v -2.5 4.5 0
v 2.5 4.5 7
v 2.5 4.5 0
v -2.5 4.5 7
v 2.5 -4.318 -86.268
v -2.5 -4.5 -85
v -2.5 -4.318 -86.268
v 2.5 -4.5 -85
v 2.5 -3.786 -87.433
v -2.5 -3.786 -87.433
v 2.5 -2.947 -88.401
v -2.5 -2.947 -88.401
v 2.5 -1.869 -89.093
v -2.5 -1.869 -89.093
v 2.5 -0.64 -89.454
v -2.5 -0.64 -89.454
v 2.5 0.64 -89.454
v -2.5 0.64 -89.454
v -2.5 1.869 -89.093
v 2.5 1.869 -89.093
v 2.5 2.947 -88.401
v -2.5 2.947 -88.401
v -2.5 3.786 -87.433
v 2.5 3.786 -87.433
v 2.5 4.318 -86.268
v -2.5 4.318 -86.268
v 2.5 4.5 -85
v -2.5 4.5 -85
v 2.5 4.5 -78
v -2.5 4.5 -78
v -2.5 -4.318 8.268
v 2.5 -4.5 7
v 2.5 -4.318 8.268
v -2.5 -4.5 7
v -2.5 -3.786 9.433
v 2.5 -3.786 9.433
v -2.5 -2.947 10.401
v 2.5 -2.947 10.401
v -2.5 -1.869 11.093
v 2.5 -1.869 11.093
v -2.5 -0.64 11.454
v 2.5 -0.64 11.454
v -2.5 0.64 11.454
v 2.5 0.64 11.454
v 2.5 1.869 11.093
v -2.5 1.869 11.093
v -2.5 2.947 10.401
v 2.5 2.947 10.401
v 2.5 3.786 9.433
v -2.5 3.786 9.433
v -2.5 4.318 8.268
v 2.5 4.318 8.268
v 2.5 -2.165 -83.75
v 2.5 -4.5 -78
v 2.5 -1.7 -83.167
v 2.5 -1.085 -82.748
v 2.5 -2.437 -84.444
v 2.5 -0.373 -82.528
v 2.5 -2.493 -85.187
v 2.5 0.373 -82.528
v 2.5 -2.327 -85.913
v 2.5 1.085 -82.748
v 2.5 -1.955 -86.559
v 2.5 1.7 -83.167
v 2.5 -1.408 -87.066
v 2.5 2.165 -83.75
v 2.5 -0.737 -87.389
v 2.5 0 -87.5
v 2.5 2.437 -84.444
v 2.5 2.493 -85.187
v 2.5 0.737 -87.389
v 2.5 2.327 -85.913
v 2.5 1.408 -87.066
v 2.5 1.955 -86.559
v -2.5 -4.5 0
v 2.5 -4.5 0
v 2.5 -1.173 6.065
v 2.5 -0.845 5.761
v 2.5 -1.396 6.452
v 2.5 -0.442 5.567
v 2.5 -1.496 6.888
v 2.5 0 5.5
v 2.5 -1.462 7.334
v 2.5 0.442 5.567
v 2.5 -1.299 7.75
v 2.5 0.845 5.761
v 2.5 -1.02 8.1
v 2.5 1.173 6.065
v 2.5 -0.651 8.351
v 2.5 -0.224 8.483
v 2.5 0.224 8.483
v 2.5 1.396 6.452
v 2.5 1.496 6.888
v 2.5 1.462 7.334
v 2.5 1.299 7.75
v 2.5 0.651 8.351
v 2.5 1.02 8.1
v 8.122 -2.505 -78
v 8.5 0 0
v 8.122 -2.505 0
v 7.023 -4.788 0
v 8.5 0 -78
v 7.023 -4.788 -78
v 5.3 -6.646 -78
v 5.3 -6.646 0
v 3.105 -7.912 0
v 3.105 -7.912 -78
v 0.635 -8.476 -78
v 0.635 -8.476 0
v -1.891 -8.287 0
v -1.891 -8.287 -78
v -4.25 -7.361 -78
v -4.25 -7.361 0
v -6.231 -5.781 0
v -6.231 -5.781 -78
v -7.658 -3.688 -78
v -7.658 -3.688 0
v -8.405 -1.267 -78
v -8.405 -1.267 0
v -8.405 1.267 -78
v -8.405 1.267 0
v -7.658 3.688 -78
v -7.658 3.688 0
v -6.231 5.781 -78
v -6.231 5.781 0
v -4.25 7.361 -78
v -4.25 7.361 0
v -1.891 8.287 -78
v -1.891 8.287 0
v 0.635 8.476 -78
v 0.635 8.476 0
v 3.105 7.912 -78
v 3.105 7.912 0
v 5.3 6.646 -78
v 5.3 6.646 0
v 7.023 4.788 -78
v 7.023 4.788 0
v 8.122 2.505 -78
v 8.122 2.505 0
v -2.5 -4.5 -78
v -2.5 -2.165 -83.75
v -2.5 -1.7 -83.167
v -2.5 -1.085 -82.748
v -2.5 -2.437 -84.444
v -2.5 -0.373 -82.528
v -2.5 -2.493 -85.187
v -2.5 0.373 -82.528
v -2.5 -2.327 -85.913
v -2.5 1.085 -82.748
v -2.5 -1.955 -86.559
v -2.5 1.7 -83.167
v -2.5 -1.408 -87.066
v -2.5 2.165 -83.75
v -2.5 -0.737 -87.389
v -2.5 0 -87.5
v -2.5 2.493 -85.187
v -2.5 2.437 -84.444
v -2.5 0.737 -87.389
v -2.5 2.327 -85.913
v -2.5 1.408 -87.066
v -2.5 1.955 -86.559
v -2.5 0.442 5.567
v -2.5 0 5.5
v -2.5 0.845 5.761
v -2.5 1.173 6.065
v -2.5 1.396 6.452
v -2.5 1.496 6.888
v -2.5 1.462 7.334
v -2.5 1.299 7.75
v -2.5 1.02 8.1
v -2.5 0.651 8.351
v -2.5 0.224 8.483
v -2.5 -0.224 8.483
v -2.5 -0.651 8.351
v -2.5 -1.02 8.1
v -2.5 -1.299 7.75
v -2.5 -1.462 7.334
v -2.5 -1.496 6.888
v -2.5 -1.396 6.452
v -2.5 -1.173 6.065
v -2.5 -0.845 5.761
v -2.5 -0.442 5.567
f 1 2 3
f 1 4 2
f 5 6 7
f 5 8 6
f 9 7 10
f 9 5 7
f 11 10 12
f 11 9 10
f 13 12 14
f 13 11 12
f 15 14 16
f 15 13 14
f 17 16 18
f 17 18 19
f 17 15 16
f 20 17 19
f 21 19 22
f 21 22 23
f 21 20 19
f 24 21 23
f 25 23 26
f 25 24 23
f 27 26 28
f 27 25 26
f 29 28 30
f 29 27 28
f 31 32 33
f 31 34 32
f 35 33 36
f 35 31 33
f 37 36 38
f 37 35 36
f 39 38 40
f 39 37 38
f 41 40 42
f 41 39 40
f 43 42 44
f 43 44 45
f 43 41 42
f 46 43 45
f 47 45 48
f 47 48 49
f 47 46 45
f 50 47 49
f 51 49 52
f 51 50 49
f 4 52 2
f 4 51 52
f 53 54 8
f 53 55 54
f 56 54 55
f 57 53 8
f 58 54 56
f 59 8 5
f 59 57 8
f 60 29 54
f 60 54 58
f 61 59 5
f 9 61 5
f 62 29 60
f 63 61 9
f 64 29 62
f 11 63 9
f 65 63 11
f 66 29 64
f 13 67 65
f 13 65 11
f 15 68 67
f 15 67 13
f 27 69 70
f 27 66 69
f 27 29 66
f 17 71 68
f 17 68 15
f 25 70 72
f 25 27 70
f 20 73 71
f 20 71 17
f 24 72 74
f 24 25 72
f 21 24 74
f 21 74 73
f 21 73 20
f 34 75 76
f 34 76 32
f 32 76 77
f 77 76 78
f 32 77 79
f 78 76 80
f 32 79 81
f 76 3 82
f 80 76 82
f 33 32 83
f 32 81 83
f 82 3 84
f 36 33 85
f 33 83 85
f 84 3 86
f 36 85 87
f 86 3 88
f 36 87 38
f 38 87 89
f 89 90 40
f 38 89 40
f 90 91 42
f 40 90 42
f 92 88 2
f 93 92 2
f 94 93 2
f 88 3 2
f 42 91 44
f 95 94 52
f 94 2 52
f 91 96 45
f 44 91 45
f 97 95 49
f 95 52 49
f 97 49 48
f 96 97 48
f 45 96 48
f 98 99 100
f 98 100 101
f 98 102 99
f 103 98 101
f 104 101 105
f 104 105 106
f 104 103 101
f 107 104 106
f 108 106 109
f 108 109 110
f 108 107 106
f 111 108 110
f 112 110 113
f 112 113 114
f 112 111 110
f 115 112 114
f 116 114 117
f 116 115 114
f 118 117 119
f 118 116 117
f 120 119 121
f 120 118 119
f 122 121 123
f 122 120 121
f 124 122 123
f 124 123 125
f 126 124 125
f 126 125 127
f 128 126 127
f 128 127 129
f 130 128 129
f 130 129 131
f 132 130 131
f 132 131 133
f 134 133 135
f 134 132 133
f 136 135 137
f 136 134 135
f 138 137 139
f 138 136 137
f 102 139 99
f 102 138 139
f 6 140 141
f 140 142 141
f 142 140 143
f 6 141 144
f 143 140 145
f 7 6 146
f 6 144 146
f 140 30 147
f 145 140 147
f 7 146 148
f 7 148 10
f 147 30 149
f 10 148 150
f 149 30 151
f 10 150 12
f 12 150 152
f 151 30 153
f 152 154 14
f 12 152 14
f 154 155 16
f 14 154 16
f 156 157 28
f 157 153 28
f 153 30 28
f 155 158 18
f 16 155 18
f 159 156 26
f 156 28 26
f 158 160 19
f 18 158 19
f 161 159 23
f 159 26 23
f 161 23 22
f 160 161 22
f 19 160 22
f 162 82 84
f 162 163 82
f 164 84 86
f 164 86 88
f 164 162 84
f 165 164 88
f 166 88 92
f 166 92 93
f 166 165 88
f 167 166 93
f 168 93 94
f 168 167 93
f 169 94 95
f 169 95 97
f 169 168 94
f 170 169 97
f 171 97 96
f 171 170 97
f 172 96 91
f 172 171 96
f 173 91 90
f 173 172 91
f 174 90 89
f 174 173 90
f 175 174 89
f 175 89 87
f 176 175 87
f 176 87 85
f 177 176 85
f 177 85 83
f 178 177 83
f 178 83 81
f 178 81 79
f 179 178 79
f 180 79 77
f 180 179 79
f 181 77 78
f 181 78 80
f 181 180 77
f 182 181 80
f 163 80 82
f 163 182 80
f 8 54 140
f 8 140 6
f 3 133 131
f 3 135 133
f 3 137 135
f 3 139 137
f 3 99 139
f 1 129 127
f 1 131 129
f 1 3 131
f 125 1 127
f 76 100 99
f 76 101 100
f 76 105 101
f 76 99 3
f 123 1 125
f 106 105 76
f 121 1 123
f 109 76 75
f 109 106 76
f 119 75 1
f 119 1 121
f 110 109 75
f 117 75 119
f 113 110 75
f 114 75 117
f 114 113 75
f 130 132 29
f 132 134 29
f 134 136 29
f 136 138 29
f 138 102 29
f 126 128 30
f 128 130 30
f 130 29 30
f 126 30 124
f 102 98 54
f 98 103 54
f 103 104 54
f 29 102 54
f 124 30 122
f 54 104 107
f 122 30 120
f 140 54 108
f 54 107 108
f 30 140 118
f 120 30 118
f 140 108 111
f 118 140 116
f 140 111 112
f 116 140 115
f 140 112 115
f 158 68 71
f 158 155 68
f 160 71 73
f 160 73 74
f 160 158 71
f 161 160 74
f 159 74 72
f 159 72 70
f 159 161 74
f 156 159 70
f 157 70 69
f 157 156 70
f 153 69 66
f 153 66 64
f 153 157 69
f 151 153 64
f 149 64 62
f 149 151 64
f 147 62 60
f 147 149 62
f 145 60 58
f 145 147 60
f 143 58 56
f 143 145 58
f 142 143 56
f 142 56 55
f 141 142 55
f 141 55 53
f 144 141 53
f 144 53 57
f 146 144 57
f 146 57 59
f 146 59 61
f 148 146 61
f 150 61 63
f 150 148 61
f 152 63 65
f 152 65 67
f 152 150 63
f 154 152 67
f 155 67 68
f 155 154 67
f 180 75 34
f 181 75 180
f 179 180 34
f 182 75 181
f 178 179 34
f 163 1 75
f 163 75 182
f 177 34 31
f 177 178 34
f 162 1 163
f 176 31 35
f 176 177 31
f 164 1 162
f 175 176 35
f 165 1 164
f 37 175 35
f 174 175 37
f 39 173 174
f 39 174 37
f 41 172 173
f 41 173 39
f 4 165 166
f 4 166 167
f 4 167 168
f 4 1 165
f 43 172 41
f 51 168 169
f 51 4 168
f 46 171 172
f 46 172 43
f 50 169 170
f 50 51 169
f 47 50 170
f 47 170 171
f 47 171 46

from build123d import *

# Parameters (mm, degrees)
SKETCH1_W           = 78
SKETCH1_H           = 8.5
SKETCH2_R           = 1.5
SKETCH2_R_2         = 2.5
BOSS_EXTRUDE1_DEPTH = 2.5


with BuildPart() as part:
    # Sketch1 → Revolve1 (revolve)
    with BuildSketch(Plane(origin=(0, 0, 0), x_dir=(0, 0, -1), z_dir=(1, 0, 0)), mode=Mode.PRIVATE) as revolve1_sk:
        with Locations((39, 4.25)):
            Rectangle(SKETCH1_W, SKETCH1_H)
    revolve(revolve1_sk.sketch.rotate(Axis((0, 0, 27.669458773), (0, 0, -1)), 90), axis=Axis((0, 0, 27.669458773), (0, 0, -1)))

    # Sketch2 → Boss-Extrude1 (add, symmetric)
    # profile 1 of 2: a face of its own
    with BuildSketch(Plane(origin=(0, 0, 0), x_dir=(0, 0, -1), z_dir=(1, 0, 0))):
        with BuildLine():
            Line((-7, 4.5), (0, 4.5))
            Line((0, 4.5), (0, -4.5))
            Line((0, -4.5), (-7, -4.5))
            ThreePointArc((-7, -4.5), (-11.5, 0), (-7, 4.5))
        make_face()
        with Locations((-7, 0)):
            Circle(SKETCH2_R, mode=Mode.SUBTRACT)
    # profile 2 of 2: a face of its own
    with BuildSketch(Plane(origin=(0, 0, 0), x_dir=(0, 0, -1), z_dir=(1, 0, 0))):
        with BuildLine():
            Line((85, 4.5), (78, 4.5))
            Line((78, 4.5), (78, -4.5))
            Line((78, -4.5), (85, -4.5))
            ThreePointArc((85, -4.5), (89.5, 0), (85, 4.5))
        make_face()
        with Locations((85, 0)):
            Circle(SKETCH2_R_2, mode=Mode.SUBTRACT)
    extrude(amount=BOSS_EXTRUDE1_DEPTH, both=True)


solid = part.part
